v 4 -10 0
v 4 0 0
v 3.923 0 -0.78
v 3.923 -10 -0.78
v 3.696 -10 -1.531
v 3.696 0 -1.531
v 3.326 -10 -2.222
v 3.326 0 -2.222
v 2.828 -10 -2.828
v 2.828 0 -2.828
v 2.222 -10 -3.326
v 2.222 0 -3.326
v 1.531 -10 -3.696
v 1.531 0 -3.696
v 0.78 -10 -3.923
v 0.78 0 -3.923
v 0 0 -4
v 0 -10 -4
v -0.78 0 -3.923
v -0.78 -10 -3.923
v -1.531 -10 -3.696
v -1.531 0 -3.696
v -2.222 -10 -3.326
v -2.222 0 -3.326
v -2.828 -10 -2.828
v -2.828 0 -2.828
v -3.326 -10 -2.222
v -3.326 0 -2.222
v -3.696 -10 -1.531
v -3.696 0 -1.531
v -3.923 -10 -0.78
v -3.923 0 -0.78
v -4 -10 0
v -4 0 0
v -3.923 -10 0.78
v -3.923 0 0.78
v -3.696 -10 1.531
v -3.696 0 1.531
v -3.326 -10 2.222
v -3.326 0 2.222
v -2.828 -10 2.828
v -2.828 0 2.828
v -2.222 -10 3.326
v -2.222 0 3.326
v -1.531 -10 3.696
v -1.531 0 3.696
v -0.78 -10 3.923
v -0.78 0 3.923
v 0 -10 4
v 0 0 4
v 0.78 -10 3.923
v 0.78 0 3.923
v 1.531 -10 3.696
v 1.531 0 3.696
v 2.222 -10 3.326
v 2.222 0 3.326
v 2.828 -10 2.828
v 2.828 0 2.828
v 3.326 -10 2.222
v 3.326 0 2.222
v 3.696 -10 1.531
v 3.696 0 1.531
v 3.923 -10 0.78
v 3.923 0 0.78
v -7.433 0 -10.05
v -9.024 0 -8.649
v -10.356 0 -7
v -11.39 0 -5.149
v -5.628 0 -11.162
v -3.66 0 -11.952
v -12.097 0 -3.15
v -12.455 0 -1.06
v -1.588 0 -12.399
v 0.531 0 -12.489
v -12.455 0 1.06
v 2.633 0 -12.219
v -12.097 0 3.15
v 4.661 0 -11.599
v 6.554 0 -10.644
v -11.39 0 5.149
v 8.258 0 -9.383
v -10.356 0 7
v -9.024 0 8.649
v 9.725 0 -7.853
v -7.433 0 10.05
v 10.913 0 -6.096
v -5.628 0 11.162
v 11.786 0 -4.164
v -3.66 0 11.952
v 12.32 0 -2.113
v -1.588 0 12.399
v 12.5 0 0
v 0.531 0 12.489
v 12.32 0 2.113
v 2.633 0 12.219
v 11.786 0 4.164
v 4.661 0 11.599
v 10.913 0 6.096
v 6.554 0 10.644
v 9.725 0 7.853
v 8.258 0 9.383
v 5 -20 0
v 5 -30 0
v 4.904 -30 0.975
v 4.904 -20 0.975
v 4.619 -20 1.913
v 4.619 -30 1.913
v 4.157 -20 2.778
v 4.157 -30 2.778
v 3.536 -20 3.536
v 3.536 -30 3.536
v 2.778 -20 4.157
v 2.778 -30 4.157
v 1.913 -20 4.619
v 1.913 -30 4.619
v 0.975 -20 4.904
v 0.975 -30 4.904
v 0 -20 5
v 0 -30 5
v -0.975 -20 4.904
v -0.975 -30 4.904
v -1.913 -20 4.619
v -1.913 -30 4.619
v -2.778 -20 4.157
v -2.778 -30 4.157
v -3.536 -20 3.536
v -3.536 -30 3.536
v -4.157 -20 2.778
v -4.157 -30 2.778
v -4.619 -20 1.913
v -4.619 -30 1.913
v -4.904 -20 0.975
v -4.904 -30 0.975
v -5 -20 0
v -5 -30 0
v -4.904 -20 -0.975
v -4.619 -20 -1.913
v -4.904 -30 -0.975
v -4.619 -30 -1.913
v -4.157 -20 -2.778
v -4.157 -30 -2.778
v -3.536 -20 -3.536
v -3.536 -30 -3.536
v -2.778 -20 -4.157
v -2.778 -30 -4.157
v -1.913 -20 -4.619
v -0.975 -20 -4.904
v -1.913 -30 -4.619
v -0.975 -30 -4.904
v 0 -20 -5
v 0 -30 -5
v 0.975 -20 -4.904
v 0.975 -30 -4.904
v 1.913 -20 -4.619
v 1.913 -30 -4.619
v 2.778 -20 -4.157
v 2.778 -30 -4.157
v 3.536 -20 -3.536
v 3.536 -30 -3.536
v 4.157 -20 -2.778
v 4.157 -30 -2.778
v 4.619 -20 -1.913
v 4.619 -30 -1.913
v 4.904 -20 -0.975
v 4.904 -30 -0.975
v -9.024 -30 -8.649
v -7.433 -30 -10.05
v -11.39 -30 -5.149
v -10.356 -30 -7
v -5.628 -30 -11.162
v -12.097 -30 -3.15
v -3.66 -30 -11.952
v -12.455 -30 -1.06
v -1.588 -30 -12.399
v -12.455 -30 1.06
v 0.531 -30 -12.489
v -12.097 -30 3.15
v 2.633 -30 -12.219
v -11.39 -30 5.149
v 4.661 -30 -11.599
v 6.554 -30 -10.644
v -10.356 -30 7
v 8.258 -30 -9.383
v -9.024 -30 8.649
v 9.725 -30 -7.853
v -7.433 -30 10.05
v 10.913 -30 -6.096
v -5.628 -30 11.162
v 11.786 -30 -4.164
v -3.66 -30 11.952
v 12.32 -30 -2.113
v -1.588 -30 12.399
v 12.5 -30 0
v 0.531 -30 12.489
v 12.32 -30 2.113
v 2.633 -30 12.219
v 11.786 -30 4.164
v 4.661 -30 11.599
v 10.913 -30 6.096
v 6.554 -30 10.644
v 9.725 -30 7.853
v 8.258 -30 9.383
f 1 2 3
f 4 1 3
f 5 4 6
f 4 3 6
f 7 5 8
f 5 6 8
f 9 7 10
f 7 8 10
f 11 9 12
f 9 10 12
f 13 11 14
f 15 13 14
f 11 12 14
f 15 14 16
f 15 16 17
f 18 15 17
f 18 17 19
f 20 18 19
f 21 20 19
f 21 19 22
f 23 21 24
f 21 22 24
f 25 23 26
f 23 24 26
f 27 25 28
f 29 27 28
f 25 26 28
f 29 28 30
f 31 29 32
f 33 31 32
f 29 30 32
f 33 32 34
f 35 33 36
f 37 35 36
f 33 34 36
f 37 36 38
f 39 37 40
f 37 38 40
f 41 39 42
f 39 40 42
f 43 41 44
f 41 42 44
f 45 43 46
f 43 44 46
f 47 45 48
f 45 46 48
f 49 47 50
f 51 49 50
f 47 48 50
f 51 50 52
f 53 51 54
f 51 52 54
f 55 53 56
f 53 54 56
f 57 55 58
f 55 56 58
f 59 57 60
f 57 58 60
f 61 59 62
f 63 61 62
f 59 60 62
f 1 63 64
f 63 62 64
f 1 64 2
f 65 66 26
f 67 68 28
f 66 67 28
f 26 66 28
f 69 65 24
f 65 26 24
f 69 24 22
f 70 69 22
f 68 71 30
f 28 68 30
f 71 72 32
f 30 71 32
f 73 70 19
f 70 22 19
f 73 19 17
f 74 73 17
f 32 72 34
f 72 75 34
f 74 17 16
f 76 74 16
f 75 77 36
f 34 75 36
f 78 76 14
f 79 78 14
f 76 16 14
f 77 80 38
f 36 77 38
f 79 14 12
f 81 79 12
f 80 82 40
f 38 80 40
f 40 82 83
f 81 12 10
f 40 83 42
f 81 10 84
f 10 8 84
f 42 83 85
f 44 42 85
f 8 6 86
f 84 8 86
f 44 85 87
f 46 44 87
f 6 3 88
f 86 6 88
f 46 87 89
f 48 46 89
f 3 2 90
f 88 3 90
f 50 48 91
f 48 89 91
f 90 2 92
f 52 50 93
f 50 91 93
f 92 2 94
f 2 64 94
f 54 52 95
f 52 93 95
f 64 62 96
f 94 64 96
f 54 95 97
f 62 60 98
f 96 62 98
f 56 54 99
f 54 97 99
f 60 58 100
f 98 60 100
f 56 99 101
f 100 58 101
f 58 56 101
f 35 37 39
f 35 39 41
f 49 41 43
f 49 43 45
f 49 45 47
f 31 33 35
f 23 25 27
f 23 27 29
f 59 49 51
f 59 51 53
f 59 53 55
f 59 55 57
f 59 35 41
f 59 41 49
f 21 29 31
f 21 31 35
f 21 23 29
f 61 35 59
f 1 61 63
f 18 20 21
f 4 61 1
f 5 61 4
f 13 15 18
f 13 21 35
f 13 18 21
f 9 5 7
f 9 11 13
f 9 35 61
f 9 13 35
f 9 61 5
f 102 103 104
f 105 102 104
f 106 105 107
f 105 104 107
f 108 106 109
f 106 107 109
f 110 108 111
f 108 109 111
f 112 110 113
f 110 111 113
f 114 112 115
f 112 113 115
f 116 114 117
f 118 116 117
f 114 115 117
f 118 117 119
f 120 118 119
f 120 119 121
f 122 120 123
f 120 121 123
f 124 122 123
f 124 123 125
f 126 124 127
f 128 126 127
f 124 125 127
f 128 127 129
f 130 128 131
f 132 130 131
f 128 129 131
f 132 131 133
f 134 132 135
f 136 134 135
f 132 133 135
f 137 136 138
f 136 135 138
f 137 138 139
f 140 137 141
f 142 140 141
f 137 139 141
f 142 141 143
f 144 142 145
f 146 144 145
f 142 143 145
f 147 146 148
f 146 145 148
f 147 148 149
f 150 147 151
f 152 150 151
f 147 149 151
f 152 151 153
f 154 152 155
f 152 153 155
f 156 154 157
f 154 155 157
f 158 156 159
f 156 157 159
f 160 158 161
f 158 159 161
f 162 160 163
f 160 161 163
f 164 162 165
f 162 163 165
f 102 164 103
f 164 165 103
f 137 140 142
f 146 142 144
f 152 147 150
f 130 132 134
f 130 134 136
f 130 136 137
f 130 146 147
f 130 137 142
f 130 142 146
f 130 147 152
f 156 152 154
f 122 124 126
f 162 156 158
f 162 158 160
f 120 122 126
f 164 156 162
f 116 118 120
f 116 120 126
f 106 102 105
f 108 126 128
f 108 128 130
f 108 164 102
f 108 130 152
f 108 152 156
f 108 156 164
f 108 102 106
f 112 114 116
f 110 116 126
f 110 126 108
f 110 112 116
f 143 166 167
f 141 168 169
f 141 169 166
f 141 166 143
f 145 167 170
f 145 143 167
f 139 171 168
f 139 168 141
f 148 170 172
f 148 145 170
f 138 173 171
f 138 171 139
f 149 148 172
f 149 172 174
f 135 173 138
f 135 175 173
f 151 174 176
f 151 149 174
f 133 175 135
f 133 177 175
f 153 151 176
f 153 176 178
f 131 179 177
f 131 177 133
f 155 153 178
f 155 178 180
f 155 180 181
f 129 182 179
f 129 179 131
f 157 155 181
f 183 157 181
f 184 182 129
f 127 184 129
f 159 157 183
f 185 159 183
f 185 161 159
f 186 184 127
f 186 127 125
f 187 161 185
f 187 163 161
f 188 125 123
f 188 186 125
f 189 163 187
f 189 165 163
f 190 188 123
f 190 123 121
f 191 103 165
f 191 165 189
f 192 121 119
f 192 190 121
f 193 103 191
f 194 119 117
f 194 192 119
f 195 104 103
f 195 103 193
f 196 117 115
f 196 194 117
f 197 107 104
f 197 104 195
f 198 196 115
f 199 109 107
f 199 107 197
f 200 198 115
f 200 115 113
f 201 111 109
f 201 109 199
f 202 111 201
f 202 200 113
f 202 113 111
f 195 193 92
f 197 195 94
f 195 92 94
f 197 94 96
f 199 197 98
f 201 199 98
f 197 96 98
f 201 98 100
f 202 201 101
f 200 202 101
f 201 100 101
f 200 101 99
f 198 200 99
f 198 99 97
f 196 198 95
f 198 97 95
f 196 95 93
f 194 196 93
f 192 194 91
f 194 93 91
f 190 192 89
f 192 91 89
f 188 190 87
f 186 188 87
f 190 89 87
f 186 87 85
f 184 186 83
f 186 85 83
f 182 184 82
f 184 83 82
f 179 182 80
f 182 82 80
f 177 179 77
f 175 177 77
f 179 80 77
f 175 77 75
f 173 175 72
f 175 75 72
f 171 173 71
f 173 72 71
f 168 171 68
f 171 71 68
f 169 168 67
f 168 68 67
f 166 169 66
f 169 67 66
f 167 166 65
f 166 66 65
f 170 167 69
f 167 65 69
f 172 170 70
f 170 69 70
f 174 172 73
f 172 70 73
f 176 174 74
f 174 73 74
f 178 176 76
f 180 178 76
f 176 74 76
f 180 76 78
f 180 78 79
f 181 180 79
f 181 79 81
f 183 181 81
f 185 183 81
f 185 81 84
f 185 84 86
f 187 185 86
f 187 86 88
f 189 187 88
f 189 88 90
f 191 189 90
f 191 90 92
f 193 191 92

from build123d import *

# Parameters (mm, degrees)
SKETCH_R        = 12.5
PAD_DEPTH       = 30
SKETCH001_R     = 5
POCKET_DEPTH    = 10
SKETCH002_R     = 4
POCKET001_DEPTH = 10


with BuildPart() as part:
    # Sketch → Pad (new body)
    with BuildSketch(Plane.XZ):
        Circle(SKETCH_R)
    extrude(amount=PAD_DEPTH)

    # Sketch001 (on Face3 of Pad) → Pocket (cut)
    with BuildSketch(Plane.XZ.offset(30)):
        Circle(SKETCH001_R)
    extrude(amount=-POCKET_DEPTH, mode=Mode.SUBTRACT)

    # Sketch002 (on Face2 of Pocket) → Pocket001 (cut)
    with BuildSketch(Plane(origin=(0, 0, 0), x_dir=(1, 0, 0), z_dir=(0, 1, 0))):
        Circle(SKETCH002_R)
    extrude(amount=-POCKET001_DEPTH, mode=Mode.SUBTRACT)


solid = part.part
